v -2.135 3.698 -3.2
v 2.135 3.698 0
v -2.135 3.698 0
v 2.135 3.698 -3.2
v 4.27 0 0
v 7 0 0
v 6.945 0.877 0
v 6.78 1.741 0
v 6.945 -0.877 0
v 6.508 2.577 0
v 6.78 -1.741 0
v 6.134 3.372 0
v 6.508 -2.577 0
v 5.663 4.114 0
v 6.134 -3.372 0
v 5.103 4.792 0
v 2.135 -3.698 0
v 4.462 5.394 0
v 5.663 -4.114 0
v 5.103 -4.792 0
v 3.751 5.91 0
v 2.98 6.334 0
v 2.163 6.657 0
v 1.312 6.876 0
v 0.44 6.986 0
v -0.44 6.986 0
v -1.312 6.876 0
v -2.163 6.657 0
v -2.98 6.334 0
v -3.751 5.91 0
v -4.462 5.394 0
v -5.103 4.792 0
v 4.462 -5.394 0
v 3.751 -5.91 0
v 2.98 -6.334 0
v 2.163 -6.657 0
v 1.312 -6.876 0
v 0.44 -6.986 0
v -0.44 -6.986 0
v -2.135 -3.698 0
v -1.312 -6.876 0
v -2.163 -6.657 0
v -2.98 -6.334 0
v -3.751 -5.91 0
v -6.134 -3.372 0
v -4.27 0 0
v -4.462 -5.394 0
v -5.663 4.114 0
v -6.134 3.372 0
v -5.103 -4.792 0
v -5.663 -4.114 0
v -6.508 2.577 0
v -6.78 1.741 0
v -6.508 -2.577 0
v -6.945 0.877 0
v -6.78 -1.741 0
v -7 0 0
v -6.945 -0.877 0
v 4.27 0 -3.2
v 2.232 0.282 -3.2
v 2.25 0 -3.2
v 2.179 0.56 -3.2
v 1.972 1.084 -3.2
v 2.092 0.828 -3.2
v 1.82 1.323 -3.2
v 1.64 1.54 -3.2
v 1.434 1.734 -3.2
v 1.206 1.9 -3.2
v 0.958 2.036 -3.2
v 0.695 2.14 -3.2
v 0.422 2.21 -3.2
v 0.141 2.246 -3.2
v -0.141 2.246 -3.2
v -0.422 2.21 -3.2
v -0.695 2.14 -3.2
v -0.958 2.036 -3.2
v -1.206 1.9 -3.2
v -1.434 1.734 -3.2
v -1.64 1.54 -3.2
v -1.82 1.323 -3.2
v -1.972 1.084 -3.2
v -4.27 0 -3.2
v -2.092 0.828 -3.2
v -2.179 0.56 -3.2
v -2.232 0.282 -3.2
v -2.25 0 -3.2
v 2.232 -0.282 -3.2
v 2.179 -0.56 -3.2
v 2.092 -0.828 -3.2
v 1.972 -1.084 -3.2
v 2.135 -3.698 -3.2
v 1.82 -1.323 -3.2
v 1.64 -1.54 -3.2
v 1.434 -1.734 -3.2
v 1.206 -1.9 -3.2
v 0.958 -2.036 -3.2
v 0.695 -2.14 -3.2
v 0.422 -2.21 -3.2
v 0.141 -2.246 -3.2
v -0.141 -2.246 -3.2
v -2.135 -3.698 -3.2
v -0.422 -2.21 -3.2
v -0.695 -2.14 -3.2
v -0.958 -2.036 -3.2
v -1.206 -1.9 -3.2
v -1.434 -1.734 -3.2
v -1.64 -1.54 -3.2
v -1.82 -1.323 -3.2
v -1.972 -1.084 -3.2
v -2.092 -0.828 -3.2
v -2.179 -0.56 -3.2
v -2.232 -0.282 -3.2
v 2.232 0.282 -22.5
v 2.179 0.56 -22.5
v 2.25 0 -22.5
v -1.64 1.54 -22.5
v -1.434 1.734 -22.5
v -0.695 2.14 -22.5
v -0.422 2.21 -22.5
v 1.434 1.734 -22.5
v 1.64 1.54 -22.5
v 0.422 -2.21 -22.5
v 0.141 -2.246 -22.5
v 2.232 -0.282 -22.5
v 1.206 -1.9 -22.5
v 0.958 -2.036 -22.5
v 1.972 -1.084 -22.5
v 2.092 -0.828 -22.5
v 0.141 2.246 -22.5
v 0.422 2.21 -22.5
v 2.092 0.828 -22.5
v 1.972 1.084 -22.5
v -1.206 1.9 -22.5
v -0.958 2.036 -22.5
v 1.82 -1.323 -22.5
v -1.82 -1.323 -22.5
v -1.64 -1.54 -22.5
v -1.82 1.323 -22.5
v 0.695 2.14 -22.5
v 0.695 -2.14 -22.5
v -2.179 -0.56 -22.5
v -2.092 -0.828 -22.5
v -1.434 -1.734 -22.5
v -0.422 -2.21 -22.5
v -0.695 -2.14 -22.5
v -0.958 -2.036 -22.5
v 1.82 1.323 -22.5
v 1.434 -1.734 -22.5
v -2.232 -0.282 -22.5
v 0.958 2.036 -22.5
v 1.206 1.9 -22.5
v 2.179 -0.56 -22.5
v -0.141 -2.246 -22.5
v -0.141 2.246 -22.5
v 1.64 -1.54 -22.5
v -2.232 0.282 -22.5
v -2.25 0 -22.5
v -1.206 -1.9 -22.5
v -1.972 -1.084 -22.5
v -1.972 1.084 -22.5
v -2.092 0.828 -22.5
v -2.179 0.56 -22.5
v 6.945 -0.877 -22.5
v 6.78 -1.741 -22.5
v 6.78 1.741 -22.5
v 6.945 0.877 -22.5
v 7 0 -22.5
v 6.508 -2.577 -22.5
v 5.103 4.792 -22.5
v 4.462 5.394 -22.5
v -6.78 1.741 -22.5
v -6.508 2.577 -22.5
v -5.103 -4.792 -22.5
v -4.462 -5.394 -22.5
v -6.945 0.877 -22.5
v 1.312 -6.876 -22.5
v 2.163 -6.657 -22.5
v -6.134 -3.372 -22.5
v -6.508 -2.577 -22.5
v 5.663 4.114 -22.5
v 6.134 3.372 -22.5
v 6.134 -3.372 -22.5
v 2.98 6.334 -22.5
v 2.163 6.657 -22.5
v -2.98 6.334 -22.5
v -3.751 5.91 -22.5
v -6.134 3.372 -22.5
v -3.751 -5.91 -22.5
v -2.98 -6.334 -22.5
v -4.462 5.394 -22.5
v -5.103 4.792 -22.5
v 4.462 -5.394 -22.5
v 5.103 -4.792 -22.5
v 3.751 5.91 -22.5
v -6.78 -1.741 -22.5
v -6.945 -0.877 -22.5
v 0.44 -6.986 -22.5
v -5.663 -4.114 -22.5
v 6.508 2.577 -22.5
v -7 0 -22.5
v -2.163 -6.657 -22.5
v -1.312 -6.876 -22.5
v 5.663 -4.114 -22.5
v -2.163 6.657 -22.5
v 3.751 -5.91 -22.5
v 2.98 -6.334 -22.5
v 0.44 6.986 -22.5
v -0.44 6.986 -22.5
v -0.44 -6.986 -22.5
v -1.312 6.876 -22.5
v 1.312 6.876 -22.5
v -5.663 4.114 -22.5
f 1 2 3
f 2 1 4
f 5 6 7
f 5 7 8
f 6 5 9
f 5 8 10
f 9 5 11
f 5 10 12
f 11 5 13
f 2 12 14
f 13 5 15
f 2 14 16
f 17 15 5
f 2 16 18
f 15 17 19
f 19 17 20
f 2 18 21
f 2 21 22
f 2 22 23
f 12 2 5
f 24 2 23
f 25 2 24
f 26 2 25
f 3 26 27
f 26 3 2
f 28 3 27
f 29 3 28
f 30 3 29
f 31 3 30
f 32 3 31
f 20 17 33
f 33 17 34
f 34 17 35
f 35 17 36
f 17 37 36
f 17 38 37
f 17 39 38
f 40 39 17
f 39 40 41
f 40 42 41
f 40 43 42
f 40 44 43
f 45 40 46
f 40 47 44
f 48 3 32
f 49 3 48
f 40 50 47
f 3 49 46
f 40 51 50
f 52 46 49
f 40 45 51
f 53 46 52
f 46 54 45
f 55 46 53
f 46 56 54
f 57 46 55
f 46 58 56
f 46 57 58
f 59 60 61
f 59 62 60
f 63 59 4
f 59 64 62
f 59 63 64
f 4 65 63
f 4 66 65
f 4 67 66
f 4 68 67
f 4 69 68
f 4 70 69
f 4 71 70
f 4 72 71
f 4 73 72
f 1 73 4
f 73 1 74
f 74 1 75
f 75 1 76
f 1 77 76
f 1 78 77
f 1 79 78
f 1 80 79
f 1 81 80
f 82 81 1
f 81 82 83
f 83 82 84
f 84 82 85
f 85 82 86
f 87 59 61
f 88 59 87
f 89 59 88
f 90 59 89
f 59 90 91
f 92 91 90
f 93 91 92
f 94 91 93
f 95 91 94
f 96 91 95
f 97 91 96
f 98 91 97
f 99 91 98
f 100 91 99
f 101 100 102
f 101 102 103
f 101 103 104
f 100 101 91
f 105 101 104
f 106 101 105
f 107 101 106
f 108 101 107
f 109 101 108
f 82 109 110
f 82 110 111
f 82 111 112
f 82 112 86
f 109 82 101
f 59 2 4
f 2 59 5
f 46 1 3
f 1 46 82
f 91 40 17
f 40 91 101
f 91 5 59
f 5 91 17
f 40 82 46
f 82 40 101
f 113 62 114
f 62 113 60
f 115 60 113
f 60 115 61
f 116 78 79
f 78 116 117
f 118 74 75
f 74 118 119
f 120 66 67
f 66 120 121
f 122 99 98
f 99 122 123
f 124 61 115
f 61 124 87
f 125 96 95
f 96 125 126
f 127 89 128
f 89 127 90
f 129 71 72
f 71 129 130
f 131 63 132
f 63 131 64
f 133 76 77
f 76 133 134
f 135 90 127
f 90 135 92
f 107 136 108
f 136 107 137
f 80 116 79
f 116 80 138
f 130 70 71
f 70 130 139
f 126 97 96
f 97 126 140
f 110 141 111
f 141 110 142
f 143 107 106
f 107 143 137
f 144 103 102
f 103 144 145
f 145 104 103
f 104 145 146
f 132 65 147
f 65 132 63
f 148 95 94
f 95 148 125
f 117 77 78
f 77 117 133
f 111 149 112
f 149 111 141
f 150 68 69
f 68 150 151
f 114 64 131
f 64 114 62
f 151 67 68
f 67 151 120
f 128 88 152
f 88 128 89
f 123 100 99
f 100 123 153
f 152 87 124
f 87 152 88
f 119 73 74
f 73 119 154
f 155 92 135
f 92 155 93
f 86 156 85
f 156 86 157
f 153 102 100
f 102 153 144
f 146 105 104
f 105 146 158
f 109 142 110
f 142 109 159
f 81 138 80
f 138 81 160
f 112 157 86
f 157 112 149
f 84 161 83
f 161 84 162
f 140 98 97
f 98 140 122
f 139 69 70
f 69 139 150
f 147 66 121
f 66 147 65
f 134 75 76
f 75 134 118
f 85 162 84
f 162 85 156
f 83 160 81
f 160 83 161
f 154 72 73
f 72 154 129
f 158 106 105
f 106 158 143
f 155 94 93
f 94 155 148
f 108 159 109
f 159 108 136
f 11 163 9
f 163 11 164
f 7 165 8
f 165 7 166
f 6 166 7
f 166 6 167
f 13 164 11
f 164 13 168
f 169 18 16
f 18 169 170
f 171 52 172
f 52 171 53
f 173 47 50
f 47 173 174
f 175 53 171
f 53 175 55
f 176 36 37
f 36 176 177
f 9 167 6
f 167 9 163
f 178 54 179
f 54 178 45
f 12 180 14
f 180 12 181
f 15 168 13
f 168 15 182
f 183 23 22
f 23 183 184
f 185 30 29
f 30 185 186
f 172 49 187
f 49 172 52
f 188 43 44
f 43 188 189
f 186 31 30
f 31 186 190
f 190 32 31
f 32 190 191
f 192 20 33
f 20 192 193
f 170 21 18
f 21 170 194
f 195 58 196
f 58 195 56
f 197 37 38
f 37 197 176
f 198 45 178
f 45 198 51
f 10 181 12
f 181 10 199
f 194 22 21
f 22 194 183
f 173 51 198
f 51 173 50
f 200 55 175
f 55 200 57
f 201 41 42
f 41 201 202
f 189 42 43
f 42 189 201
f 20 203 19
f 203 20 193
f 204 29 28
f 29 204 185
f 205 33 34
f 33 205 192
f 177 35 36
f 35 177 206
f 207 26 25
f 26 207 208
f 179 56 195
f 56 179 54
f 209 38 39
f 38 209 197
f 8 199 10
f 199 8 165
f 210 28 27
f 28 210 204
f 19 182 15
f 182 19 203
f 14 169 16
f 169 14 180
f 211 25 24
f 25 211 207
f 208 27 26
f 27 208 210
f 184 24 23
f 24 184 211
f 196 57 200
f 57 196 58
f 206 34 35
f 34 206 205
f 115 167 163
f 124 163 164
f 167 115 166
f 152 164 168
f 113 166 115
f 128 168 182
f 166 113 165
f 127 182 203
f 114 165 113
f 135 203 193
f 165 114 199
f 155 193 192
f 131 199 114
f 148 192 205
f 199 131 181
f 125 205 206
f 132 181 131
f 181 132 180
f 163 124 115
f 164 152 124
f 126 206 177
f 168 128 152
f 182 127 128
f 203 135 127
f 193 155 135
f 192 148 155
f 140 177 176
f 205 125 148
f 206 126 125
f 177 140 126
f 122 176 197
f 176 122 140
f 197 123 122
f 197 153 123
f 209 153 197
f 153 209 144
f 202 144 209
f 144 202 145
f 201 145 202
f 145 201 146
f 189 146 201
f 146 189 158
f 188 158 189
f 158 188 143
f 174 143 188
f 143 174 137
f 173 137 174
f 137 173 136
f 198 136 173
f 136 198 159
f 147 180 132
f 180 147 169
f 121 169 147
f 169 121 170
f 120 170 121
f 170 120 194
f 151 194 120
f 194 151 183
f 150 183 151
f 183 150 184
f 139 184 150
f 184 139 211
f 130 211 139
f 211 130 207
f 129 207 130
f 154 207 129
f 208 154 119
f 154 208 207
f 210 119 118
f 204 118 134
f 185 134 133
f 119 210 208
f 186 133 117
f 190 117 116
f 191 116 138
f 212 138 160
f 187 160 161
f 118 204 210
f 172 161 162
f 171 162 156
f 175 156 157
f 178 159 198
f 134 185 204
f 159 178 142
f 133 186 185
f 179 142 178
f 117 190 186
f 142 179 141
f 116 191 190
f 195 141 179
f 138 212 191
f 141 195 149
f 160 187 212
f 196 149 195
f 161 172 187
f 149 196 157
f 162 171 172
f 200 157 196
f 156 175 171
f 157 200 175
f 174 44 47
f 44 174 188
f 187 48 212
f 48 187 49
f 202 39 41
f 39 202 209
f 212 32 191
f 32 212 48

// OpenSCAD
$fn = 50;

difference() {
	union() {
		translate(v = [0, 0, -22.5]) {
			cylinder(h = 22.5, r = 7.0);
		}
	}
	union() {
		translate(v = [0, 0, 0]) {
			rotate(a = [0, 0, 0]) {
				difference() {
					union() {
						translate(v = [0, 0, -3.2]) {
							linear_extrude(height = 3.2) {
								polygon(points = [[4.2698, 0.0], [2.1349000000000005, 3.697755269078796], [-2.134899999999999, 3.6977552690787965], [-4.2698, 5.228996902999369e-16], [-2.134900000000002, -3.6977552690787956], [2.1348999999999974, -3.697755269078798]]);
							}
						}
					}
					union();
				}
			}
		}
		#translate(v = [0, 0, -100.0]) {
			cylinder(h = 200, r = 2.25);
		}
	}
}
